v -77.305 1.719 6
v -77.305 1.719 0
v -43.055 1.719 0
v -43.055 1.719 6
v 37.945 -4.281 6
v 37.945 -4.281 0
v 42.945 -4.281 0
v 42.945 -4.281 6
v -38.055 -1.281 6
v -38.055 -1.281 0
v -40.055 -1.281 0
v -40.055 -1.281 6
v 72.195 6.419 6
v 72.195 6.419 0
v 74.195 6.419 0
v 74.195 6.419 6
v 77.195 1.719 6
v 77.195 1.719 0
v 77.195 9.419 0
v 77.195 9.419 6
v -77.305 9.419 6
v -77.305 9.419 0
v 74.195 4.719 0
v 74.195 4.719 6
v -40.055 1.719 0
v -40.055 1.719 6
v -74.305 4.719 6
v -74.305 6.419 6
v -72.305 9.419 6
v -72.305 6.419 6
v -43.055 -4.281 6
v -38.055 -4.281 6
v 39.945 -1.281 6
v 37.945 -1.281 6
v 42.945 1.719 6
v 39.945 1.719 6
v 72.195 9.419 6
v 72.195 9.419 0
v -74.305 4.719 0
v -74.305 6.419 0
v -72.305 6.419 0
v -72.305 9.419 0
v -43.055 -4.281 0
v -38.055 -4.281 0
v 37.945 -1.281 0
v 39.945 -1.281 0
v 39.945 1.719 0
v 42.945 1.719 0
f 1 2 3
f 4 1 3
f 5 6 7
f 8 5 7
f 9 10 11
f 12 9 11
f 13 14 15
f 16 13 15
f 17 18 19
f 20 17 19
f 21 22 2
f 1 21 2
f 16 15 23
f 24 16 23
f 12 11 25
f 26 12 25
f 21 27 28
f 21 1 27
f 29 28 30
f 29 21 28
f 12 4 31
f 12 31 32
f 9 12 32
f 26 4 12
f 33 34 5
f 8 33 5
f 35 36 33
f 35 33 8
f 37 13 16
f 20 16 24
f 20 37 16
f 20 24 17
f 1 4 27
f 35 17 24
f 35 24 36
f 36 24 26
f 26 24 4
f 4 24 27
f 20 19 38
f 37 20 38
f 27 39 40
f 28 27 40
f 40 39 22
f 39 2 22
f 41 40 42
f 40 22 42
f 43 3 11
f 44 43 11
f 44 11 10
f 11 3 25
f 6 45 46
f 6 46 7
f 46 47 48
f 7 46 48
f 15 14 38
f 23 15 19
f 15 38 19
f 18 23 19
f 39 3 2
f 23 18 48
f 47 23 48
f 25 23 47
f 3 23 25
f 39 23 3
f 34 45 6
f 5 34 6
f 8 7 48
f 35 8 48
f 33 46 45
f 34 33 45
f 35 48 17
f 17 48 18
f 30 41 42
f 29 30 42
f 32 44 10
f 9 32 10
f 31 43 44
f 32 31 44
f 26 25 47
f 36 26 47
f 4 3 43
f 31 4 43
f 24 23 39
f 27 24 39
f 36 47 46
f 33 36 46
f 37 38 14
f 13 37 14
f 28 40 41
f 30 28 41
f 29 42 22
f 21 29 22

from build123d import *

# Parameters (mm, degrees)
F1_DEPTH = 6


with BuildPart() as f1:
    # F0 (on Top) → F1 (new body)
    with BuildSketch(Plane.XY):
        Polygon((-72.304564, 6.418628), (-72.304564, 9.418628), (-77.304564, 9.418628), (-77.304564, 1.718628), (-43.054564, 1.718628), (-43.054564, -4.281372), (-38.054564, -4.281372), (-38.054564, -1.281372), (-40.054564, -1.281372), (-40.054564, 1.718628), (39.945436, 1.718628), (39.945436, -1.281372), (37.945436, -1.281372), (37.945436, -4.281372), (42.945436, -4.281372), (42.945436, 1.718628), (77.195436, 1.718628), (77.195436, 9.418628), (72.195436, 9.418628), (72.195436, 6.418628), (74.195436, 6.418628), (74.195436, 4.718628), (-74.304564, 4.718628), (-74.304564, 6.418628), align=None)
    extrude(amount=F1_DEPTH)


solid = f1.part
